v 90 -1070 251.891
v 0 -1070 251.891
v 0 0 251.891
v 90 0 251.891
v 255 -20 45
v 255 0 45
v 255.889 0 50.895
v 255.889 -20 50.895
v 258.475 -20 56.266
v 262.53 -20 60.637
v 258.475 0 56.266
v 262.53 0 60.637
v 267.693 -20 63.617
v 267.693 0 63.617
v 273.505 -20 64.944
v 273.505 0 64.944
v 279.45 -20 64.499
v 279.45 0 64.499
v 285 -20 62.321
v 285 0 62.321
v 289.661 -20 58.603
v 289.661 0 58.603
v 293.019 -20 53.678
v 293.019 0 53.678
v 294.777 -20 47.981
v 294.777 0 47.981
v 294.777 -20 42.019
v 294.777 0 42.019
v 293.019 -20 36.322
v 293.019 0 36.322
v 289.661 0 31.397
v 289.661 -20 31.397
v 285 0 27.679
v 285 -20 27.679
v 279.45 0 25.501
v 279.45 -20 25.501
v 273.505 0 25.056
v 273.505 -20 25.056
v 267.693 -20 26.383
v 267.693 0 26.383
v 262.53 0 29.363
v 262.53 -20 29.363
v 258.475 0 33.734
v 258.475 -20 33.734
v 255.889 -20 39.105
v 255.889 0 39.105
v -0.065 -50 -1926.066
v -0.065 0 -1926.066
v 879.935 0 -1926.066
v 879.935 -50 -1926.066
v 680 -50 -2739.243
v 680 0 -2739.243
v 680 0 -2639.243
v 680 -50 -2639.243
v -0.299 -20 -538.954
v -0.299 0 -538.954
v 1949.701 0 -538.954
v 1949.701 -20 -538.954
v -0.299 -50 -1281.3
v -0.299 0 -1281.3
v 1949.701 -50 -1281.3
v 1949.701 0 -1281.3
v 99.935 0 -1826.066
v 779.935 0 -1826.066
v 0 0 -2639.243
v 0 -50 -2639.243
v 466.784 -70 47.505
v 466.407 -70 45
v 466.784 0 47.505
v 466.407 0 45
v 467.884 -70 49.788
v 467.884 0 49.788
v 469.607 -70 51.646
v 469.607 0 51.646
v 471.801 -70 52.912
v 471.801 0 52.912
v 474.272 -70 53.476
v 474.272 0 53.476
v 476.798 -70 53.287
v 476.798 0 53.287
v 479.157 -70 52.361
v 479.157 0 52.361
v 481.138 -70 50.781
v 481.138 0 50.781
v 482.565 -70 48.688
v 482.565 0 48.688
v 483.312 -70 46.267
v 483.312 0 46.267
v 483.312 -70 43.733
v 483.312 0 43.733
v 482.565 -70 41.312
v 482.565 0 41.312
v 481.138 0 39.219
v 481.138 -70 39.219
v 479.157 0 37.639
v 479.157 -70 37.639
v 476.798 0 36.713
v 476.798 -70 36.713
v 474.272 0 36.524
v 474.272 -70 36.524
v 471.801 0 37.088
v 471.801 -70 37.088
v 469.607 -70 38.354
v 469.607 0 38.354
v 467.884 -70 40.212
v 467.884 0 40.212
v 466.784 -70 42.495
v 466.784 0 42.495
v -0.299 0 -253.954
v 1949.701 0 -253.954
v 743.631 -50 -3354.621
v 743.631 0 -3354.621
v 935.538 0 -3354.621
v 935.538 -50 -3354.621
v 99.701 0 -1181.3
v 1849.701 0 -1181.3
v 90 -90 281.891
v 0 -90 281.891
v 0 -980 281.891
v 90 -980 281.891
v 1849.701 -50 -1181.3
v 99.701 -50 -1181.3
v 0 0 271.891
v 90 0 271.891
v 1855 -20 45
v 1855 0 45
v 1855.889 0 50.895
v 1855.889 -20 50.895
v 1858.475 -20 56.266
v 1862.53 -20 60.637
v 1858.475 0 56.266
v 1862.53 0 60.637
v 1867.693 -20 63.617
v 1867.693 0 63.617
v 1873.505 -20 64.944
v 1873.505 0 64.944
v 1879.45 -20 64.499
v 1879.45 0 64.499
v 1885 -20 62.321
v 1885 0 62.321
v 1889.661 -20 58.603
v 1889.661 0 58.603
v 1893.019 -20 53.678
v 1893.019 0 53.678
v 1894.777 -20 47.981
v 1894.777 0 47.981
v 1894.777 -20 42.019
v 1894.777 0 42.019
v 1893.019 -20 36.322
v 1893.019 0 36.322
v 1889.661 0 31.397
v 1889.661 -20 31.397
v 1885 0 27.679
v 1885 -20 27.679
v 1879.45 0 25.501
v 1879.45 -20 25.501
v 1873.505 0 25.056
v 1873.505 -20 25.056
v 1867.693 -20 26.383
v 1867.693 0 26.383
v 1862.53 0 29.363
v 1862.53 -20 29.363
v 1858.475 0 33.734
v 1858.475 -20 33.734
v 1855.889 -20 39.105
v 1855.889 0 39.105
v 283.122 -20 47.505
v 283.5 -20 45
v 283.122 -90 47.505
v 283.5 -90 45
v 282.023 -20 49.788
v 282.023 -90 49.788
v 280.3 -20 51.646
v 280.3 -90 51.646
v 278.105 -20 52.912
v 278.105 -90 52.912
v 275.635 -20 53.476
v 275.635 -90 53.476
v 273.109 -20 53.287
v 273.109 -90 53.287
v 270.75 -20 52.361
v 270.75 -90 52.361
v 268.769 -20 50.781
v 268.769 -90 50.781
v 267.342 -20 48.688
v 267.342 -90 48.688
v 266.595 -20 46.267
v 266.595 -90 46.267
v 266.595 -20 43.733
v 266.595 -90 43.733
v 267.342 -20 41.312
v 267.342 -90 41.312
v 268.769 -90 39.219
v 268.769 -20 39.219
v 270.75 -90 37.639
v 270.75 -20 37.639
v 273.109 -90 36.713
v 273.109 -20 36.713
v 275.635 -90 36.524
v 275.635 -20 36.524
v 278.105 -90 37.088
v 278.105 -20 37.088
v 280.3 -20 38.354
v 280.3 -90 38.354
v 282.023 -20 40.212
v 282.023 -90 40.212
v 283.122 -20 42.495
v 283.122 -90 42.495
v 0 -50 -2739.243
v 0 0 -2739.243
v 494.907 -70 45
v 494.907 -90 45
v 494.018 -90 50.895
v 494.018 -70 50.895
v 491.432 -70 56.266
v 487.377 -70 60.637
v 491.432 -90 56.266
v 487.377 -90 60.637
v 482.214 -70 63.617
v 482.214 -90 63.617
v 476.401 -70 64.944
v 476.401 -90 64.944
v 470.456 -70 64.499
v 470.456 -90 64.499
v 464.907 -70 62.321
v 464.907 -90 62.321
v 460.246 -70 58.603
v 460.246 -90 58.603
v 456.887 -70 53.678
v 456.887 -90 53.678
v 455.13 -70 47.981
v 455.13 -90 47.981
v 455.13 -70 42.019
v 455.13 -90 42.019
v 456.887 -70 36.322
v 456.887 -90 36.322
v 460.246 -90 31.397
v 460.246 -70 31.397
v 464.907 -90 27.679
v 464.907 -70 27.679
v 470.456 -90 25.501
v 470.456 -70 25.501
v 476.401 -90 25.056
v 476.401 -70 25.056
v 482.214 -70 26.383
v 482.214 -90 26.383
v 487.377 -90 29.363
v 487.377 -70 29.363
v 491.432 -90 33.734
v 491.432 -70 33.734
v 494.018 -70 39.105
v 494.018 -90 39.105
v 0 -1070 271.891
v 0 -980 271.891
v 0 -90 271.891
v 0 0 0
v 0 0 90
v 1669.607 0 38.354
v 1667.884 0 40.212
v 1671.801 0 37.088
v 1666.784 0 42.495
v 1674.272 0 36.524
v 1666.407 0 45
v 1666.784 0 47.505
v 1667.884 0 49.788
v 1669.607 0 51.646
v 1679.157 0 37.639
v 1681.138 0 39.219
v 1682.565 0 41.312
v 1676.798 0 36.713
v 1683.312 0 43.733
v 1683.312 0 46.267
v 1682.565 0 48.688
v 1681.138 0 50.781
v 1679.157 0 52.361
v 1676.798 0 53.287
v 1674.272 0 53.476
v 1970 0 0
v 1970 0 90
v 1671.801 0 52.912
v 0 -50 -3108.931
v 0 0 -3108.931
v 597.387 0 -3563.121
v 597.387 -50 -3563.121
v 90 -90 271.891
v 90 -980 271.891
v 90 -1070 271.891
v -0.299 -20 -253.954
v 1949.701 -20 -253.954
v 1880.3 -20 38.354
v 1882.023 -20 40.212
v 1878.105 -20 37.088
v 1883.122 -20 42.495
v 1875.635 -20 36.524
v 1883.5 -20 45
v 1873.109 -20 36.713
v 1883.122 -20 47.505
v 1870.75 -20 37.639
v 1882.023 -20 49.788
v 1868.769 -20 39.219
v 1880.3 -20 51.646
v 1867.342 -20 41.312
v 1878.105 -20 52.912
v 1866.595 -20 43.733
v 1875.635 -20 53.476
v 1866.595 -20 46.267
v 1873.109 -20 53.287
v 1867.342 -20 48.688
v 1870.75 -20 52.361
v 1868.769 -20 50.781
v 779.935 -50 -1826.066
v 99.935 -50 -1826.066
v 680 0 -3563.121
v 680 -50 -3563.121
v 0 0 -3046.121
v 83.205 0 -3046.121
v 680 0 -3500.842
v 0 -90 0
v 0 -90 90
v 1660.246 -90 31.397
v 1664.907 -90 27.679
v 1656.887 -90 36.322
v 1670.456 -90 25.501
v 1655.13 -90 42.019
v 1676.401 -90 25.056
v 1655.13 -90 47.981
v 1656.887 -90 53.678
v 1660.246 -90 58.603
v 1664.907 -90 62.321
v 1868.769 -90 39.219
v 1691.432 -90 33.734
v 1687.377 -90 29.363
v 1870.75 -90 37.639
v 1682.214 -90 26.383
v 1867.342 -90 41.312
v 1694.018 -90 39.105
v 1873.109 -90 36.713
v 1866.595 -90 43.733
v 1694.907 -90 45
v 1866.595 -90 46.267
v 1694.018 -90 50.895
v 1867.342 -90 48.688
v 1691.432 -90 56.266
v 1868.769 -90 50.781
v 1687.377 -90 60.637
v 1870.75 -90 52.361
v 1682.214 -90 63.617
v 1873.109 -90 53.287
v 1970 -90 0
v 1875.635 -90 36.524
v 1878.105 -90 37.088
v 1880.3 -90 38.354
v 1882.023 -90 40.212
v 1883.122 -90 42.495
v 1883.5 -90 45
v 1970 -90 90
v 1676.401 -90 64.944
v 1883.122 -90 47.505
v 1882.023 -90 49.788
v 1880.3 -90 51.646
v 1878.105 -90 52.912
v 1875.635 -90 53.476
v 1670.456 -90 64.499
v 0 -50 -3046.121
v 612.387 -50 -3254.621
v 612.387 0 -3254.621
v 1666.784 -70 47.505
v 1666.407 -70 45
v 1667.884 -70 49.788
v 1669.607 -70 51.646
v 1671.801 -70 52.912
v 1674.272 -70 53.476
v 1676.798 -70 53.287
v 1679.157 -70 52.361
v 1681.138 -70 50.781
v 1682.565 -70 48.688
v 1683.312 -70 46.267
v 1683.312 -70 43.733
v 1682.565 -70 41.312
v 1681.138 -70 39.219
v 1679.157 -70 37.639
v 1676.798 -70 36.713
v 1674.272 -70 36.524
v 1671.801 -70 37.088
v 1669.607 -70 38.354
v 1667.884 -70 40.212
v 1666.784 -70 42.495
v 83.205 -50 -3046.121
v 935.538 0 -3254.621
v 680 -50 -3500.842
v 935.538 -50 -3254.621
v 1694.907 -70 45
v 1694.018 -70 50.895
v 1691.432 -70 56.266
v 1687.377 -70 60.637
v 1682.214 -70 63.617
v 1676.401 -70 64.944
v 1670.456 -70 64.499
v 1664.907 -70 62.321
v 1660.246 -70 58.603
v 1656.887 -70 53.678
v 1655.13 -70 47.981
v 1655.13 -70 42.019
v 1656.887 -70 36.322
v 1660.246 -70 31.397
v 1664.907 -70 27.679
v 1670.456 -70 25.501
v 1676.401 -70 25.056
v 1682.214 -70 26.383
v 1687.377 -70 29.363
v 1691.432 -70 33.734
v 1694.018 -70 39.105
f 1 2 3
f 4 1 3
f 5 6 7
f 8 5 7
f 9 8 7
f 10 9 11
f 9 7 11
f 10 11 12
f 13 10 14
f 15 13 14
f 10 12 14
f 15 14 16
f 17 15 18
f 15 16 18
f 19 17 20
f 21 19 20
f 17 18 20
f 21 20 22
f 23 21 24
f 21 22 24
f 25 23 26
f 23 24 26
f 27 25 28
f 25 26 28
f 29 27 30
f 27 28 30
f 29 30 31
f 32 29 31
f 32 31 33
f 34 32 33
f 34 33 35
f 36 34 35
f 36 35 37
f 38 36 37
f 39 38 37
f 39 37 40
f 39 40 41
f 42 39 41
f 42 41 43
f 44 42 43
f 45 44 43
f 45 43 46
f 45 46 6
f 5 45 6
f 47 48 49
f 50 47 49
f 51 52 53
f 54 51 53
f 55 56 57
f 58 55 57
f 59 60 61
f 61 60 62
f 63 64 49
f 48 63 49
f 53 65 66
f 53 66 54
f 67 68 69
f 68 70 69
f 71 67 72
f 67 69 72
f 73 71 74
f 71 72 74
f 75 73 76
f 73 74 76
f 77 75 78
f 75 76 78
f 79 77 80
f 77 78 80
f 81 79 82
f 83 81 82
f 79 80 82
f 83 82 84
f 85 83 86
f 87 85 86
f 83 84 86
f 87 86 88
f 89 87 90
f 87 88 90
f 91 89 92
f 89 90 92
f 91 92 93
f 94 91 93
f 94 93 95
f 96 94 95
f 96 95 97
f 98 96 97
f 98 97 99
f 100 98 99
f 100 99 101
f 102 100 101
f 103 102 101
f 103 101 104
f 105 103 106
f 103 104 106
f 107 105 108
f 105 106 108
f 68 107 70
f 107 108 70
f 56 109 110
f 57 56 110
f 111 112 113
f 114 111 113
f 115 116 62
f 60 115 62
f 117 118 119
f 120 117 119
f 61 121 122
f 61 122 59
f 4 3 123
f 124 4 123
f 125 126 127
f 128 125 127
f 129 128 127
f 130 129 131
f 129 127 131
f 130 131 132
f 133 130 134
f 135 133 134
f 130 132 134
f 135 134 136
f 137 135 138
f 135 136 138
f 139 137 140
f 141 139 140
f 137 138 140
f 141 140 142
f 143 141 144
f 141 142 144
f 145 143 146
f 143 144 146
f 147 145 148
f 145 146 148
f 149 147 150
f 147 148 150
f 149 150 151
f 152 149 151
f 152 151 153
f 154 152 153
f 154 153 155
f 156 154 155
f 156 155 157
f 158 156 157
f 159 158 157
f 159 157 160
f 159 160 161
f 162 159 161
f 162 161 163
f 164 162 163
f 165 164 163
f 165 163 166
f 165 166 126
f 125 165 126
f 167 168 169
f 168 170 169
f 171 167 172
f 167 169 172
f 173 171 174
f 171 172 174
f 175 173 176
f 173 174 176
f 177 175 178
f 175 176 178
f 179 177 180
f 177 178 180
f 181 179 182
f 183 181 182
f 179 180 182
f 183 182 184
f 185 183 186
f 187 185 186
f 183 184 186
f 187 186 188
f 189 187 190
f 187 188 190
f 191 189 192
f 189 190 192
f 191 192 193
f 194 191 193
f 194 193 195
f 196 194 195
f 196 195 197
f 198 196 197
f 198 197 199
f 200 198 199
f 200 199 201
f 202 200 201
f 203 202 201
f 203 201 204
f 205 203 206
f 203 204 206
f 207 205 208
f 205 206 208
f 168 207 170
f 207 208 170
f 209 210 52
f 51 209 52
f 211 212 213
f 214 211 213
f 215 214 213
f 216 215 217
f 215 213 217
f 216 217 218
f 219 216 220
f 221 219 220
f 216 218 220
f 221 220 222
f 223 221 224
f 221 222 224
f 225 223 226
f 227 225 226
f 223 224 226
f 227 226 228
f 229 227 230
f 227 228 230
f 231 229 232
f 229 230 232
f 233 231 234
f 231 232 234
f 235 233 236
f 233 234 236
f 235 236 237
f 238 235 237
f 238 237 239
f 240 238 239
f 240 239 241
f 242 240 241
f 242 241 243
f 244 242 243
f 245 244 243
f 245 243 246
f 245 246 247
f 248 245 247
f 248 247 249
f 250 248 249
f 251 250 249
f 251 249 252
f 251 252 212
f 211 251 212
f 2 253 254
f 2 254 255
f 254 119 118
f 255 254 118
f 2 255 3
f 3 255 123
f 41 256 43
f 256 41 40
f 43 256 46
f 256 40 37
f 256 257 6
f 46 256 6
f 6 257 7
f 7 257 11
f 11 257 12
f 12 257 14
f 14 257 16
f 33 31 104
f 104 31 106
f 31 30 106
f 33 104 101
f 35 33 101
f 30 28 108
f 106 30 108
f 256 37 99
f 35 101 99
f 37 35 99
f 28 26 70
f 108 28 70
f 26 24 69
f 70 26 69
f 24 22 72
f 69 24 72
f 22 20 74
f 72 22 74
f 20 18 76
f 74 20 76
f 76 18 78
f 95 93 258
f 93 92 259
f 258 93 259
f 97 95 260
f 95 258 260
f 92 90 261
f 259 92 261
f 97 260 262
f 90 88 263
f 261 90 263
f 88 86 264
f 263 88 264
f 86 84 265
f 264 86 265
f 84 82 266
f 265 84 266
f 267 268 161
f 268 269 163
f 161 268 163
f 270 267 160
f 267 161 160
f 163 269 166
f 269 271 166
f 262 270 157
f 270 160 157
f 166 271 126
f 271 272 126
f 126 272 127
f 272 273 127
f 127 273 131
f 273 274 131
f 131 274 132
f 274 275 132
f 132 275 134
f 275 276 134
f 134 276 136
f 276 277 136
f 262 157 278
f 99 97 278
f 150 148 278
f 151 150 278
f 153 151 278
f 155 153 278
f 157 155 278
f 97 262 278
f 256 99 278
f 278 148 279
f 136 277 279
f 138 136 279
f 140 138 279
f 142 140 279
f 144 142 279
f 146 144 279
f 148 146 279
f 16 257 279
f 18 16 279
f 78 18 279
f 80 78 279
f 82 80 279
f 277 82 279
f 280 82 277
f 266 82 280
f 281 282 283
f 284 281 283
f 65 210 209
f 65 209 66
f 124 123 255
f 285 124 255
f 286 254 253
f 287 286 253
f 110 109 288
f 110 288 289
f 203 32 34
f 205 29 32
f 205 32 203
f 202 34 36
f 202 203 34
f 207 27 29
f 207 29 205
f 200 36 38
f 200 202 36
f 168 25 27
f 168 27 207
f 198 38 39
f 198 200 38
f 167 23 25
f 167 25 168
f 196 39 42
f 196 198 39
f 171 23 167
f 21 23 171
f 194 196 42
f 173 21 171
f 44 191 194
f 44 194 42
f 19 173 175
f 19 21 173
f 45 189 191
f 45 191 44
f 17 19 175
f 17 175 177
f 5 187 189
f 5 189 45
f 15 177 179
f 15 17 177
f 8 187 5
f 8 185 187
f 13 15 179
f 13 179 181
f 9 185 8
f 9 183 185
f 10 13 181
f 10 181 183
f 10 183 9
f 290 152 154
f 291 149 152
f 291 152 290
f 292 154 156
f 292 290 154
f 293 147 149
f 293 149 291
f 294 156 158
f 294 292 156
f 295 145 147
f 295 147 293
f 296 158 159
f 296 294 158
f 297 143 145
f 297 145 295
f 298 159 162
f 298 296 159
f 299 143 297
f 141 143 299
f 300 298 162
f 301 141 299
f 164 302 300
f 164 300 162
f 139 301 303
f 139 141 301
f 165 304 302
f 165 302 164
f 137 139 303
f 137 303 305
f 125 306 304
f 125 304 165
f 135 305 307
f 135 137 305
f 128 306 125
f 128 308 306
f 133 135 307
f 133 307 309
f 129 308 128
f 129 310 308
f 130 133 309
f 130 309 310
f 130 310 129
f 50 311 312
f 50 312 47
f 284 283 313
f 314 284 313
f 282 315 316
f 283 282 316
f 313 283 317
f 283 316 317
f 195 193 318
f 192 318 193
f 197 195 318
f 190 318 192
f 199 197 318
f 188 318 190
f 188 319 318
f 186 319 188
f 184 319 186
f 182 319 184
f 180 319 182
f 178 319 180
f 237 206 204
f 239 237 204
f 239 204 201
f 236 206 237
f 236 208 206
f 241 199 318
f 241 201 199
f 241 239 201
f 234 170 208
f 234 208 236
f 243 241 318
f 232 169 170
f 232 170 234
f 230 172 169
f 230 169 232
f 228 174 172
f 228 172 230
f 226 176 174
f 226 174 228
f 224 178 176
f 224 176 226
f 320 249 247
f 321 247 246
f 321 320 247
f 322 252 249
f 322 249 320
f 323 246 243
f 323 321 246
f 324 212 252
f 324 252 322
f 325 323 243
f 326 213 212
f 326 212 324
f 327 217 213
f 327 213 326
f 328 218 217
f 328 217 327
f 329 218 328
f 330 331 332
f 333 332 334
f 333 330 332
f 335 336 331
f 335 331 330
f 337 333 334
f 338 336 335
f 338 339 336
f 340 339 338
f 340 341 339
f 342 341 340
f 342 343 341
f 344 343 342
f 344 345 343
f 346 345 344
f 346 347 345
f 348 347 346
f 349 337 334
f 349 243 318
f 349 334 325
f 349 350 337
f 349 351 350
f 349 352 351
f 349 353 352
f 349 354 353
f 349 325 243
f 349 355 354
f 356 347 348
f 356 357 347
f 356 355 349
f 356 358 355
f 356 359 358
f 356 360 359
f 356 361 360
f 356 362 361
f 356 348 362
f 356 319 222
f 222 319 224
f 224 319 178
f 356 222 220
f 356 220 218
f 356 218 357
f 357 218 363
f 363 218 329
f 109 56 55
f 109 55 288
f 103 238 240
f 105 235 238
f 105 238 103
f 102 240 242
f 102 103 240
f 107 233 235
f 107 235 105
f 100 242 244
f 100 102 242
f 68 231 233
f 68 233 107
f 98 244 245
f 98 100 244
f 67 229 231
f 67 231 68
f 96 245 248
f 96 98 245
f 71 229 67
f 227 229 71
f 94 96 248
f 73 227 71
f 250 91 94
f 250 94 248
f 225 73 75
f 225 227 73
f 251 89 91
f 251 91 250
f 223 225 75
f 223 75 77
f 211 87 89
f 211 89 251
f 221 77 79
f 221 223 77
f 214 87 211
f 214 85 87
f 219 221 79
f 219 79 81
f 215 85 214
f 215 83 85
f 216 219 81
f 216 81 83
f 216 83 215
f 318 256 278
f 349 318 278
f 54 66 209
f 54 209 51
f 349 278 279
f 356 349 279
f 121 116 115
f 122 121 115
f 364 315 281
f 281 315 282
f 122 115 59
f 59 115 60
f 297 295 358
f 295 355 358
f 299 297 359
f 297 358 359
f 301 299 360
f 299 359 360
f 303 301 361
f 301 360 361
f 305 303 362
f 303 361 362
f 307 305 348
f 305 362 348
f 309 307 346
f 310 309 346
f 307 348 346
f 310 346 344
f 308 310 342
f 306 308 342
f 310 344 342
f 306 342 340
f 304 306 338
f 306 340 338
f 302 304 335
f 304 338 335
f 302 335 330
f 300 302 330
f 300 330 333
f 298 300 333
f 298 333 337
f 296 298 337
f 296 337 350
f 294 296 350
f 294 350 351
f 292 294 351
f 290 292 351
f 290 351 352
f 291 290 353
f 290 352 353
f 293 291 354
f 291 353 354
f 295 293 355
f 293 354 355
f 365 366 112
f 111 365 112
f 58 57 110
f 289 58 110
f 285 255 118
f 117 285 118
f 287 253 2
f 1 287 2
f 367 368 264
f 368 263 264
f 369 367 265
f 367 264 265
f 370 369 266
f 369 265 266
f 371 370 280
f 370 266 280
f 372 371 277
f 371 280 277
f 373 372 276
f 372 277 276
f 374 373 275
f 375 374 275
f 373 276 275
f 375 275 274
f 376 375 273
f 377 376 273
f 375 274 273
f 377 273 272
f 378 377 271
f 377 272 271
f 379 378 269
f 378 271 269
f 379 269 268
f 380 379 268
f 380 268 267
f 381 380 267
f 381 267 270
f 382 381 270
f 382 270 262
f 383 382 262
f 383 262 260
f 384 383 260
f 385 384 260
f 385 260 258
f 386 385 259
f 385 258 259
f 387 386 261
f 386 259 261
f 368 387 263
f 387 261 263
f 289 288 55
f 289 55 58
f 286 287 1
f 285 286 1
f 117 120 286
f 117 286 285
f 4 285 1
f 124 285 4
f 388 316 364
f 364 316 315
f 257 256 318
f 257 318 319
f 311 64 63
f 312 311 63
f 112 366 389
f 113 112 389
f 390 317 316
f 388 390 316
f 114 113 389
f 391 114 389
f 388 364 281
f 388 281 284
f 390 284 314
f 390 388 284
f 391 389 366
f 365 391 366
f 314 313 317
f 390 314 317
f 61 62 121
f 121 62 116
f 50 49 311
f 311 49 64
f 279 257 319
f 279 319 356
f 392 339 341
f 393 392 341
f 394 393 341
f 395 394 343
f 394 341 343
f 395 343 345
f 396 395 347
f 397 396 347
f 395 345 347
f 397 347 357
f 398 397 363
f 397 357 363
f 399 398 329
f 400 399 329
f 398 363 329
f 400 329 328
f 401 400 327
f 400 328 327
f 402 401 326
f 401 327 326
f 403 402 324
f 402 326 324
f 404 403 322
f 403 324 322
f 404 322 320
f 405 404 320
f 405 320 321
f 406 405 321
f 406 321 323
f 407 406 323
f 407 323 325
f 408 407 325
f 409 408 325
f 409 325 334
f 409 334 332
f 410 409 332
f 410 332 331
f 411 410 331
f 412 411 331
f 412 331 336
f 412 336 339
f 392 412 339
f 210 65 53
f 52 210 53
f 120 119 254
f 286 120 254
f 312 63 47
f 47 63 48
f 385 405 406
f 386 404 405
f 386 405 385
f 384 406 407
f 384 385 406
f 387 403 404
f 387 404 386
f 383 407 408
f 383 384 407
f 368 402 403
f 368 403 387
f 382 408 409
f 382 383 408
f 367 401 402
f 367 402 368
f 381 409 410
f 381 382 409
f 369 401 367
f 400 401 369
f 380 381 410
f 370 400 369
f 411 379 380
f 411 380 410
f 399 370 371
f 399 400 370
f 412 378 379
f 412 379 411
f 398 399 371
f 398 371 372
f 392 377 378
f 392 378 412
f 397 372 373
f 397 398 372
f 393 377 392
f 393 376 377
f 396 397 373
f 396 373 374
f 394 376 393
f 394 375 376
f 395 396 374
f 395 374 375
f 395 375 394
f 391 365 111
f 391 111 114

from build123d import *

# Parameters (mm, degrees)
F0_W            = 1970
F0_H            = 90
F1_DEPTH        = 90
F3_DEPTH        = 90
F4_W            = 1950
F4_H            = 285
F5_DEPTH        = 20
F6_DEPTH        = 50
F7_DEPTH        = 50
F4_W_2          = 680
F4_H_2          = 100
F8_DEPTH        = 50
F9_DEPTH        = 25
F10_DEPTH       = 50
F13_D           = 17
F13_DEPTH       = 100
F13_START       = 25
F13_CBORE_D     = 40
F13_CBORE_DEPTH = 20
F13_TIP         = 5.1073152617
F15_D           = 17
F15_DEPTH       = 100
F15_CBORE_D     = 40
F15_CBORE_DEPTH = 20
F15_TIP         = 5.1073152617
F16_DEPTH       = 50


with BuildPart() as f1:
    # F0 (on Front) → F1 (new body)
    with BuildSketch(Plane.XZ):
        with Locations((985, 45)):
            Rectangle(F0_W, F0_H)
    extrude(amount=F1_DEPTH)

    # F13
    # its depths count from where the whole tool has entered the part; down to there all is cleared
    with Locations(Plane.XZ.offset(115).offset(-F13_START)):
        with Locations((1674.9068069458, 45), (474.9068069458, 45)):
            CounterBoreHole(F13_D / 2, F13_CBORE_D / 2, F13_CBORE_DEPTH, depth=F13_DEPTH)
            with Locations((0, 0, -(F13_DEPTH + F13_TIP / 2))):  # 118° drill point
                Cone(0, F13_D / 2, F13_TIP, mode=Mode.SUBTRACT)

    # F15
    with Locations(Plane(origin=(0, 0, 0), x_dir=(-1, 0, 0), z_dir=(0, 1, 0))):
        with Locations((-1875, 45), (-275, 45)):
            CounterBoreHole(F15_D / 2, F15_CBORE_D / 2, F15_CBORE_DEPTH, depth=F15_DEPTH)
            with Locations((0, 0, -(F15_DEPTH + F15_TIP / 2))):  # 118° drill point
                Cone(0, F15_D / 2, F15_TIP, mode=Mode.SUBTRACT)


with BuildPart() as f3:
    # F2 (on Right) → F3 (new body)
    with BuildSketch(Plane.YZ):
        Polygon((-1070, 251.8908083439), (0, 251.8908083439), (0, 271.8908083439), (-90, 271.8908083439), (-90, 281.8908083439), (-980, 281.8908083439), (-980, 271.8908083439), (-1070, 271.8908083439), align=None)
    extrude(amount=F3_DEPTH)


with BuildPart() as f5:
    # F4 (on Front) → F5 (new body)
    with BuildSketch(Plane.XZ):
        with Locations((974.7011631165, -396.4535624759)):
            Rectangle(F4_W, F4_H)
    extrude(amount=F5_DEPTH)


with BuildPart() as f6:
    # F4 (on Front) → F6 (new body)
    with BuildSketch(Plane.XZ):
        Polygon((1849.7011631165, -1181.3003856914), (99.7011631165, -1181.3003856914), (-0.2988368835, -1281.3003856914), (1949.7011631165, -1281.3003856914), align=None)
    extrude(amount=F6_DEPTH)


with BuildPart() as f7:
    # F4 (on Front) → F7 (new body)
    with BuildSketch(Plane.XZ):
        Polygon((779.9345557821, -1826.0660855043), (99.9345557821, -1826.0660855043), (-0.0654442179, -1926.0660855043), (879.9345557821, -1926.0660855043), align=None)
    extrude(amount=F7_DEPTH)


with BuildPart() as f8:
    # F4 (on Front) → F8 (new body)
    with BuildSketch(Plane.XZ):
        with Locations((340, -2689.2425537109)):
            Rectangle(F4_W_2, F4_H_2)
    extrude(amount=F8_DEPTH)


with BuildPart() as f9:
    # F4 (on Front) → F9 (new body)
    with BuildSketch(Plane.XZ):
        Polygon((83.2051316108, -3046.12084198), (0, -3046.12084198), (0, -3108.931015227), (597.3870061741, -3563.12084198), (680, -3563.12084198), (680, -3500.8423168428), (488.0930180991, -3354.62084198), align=None)
    extrude(amount=F9_DEPTH)

    # F4 (on Front) → F10 (join)
    with BuildSketch(Plane.XZ):
        Polygon((83.2051316108, -3046.12084198), (0, -3046.12084198), (0, -3108.931015227), (597.3870061741, -3563.12084198), (680, -3563.12084198), (680, -3500.8423168428), (488.0930180991, -3354.62084198), align=None)
    extrude(amount=F10_DEPTH)


with BuildPart() as f16:
    # F4 (on Front) → F16 (new body)
    with BuildSketch(Plane.XZ):
        Polygon((935.538090504, -3354.6207904816), (935.538090504, -3254.6207904816), (612.3870611191, -3254.6207904816), (743.6311086031, -3354.6207904816), align=None)
    extrude(amount=F16_DEPTH)


solid = Compound([f1.part, f3.part, f5.part, f6.part, f7.part, f8.part, f9.part, f16.part])
